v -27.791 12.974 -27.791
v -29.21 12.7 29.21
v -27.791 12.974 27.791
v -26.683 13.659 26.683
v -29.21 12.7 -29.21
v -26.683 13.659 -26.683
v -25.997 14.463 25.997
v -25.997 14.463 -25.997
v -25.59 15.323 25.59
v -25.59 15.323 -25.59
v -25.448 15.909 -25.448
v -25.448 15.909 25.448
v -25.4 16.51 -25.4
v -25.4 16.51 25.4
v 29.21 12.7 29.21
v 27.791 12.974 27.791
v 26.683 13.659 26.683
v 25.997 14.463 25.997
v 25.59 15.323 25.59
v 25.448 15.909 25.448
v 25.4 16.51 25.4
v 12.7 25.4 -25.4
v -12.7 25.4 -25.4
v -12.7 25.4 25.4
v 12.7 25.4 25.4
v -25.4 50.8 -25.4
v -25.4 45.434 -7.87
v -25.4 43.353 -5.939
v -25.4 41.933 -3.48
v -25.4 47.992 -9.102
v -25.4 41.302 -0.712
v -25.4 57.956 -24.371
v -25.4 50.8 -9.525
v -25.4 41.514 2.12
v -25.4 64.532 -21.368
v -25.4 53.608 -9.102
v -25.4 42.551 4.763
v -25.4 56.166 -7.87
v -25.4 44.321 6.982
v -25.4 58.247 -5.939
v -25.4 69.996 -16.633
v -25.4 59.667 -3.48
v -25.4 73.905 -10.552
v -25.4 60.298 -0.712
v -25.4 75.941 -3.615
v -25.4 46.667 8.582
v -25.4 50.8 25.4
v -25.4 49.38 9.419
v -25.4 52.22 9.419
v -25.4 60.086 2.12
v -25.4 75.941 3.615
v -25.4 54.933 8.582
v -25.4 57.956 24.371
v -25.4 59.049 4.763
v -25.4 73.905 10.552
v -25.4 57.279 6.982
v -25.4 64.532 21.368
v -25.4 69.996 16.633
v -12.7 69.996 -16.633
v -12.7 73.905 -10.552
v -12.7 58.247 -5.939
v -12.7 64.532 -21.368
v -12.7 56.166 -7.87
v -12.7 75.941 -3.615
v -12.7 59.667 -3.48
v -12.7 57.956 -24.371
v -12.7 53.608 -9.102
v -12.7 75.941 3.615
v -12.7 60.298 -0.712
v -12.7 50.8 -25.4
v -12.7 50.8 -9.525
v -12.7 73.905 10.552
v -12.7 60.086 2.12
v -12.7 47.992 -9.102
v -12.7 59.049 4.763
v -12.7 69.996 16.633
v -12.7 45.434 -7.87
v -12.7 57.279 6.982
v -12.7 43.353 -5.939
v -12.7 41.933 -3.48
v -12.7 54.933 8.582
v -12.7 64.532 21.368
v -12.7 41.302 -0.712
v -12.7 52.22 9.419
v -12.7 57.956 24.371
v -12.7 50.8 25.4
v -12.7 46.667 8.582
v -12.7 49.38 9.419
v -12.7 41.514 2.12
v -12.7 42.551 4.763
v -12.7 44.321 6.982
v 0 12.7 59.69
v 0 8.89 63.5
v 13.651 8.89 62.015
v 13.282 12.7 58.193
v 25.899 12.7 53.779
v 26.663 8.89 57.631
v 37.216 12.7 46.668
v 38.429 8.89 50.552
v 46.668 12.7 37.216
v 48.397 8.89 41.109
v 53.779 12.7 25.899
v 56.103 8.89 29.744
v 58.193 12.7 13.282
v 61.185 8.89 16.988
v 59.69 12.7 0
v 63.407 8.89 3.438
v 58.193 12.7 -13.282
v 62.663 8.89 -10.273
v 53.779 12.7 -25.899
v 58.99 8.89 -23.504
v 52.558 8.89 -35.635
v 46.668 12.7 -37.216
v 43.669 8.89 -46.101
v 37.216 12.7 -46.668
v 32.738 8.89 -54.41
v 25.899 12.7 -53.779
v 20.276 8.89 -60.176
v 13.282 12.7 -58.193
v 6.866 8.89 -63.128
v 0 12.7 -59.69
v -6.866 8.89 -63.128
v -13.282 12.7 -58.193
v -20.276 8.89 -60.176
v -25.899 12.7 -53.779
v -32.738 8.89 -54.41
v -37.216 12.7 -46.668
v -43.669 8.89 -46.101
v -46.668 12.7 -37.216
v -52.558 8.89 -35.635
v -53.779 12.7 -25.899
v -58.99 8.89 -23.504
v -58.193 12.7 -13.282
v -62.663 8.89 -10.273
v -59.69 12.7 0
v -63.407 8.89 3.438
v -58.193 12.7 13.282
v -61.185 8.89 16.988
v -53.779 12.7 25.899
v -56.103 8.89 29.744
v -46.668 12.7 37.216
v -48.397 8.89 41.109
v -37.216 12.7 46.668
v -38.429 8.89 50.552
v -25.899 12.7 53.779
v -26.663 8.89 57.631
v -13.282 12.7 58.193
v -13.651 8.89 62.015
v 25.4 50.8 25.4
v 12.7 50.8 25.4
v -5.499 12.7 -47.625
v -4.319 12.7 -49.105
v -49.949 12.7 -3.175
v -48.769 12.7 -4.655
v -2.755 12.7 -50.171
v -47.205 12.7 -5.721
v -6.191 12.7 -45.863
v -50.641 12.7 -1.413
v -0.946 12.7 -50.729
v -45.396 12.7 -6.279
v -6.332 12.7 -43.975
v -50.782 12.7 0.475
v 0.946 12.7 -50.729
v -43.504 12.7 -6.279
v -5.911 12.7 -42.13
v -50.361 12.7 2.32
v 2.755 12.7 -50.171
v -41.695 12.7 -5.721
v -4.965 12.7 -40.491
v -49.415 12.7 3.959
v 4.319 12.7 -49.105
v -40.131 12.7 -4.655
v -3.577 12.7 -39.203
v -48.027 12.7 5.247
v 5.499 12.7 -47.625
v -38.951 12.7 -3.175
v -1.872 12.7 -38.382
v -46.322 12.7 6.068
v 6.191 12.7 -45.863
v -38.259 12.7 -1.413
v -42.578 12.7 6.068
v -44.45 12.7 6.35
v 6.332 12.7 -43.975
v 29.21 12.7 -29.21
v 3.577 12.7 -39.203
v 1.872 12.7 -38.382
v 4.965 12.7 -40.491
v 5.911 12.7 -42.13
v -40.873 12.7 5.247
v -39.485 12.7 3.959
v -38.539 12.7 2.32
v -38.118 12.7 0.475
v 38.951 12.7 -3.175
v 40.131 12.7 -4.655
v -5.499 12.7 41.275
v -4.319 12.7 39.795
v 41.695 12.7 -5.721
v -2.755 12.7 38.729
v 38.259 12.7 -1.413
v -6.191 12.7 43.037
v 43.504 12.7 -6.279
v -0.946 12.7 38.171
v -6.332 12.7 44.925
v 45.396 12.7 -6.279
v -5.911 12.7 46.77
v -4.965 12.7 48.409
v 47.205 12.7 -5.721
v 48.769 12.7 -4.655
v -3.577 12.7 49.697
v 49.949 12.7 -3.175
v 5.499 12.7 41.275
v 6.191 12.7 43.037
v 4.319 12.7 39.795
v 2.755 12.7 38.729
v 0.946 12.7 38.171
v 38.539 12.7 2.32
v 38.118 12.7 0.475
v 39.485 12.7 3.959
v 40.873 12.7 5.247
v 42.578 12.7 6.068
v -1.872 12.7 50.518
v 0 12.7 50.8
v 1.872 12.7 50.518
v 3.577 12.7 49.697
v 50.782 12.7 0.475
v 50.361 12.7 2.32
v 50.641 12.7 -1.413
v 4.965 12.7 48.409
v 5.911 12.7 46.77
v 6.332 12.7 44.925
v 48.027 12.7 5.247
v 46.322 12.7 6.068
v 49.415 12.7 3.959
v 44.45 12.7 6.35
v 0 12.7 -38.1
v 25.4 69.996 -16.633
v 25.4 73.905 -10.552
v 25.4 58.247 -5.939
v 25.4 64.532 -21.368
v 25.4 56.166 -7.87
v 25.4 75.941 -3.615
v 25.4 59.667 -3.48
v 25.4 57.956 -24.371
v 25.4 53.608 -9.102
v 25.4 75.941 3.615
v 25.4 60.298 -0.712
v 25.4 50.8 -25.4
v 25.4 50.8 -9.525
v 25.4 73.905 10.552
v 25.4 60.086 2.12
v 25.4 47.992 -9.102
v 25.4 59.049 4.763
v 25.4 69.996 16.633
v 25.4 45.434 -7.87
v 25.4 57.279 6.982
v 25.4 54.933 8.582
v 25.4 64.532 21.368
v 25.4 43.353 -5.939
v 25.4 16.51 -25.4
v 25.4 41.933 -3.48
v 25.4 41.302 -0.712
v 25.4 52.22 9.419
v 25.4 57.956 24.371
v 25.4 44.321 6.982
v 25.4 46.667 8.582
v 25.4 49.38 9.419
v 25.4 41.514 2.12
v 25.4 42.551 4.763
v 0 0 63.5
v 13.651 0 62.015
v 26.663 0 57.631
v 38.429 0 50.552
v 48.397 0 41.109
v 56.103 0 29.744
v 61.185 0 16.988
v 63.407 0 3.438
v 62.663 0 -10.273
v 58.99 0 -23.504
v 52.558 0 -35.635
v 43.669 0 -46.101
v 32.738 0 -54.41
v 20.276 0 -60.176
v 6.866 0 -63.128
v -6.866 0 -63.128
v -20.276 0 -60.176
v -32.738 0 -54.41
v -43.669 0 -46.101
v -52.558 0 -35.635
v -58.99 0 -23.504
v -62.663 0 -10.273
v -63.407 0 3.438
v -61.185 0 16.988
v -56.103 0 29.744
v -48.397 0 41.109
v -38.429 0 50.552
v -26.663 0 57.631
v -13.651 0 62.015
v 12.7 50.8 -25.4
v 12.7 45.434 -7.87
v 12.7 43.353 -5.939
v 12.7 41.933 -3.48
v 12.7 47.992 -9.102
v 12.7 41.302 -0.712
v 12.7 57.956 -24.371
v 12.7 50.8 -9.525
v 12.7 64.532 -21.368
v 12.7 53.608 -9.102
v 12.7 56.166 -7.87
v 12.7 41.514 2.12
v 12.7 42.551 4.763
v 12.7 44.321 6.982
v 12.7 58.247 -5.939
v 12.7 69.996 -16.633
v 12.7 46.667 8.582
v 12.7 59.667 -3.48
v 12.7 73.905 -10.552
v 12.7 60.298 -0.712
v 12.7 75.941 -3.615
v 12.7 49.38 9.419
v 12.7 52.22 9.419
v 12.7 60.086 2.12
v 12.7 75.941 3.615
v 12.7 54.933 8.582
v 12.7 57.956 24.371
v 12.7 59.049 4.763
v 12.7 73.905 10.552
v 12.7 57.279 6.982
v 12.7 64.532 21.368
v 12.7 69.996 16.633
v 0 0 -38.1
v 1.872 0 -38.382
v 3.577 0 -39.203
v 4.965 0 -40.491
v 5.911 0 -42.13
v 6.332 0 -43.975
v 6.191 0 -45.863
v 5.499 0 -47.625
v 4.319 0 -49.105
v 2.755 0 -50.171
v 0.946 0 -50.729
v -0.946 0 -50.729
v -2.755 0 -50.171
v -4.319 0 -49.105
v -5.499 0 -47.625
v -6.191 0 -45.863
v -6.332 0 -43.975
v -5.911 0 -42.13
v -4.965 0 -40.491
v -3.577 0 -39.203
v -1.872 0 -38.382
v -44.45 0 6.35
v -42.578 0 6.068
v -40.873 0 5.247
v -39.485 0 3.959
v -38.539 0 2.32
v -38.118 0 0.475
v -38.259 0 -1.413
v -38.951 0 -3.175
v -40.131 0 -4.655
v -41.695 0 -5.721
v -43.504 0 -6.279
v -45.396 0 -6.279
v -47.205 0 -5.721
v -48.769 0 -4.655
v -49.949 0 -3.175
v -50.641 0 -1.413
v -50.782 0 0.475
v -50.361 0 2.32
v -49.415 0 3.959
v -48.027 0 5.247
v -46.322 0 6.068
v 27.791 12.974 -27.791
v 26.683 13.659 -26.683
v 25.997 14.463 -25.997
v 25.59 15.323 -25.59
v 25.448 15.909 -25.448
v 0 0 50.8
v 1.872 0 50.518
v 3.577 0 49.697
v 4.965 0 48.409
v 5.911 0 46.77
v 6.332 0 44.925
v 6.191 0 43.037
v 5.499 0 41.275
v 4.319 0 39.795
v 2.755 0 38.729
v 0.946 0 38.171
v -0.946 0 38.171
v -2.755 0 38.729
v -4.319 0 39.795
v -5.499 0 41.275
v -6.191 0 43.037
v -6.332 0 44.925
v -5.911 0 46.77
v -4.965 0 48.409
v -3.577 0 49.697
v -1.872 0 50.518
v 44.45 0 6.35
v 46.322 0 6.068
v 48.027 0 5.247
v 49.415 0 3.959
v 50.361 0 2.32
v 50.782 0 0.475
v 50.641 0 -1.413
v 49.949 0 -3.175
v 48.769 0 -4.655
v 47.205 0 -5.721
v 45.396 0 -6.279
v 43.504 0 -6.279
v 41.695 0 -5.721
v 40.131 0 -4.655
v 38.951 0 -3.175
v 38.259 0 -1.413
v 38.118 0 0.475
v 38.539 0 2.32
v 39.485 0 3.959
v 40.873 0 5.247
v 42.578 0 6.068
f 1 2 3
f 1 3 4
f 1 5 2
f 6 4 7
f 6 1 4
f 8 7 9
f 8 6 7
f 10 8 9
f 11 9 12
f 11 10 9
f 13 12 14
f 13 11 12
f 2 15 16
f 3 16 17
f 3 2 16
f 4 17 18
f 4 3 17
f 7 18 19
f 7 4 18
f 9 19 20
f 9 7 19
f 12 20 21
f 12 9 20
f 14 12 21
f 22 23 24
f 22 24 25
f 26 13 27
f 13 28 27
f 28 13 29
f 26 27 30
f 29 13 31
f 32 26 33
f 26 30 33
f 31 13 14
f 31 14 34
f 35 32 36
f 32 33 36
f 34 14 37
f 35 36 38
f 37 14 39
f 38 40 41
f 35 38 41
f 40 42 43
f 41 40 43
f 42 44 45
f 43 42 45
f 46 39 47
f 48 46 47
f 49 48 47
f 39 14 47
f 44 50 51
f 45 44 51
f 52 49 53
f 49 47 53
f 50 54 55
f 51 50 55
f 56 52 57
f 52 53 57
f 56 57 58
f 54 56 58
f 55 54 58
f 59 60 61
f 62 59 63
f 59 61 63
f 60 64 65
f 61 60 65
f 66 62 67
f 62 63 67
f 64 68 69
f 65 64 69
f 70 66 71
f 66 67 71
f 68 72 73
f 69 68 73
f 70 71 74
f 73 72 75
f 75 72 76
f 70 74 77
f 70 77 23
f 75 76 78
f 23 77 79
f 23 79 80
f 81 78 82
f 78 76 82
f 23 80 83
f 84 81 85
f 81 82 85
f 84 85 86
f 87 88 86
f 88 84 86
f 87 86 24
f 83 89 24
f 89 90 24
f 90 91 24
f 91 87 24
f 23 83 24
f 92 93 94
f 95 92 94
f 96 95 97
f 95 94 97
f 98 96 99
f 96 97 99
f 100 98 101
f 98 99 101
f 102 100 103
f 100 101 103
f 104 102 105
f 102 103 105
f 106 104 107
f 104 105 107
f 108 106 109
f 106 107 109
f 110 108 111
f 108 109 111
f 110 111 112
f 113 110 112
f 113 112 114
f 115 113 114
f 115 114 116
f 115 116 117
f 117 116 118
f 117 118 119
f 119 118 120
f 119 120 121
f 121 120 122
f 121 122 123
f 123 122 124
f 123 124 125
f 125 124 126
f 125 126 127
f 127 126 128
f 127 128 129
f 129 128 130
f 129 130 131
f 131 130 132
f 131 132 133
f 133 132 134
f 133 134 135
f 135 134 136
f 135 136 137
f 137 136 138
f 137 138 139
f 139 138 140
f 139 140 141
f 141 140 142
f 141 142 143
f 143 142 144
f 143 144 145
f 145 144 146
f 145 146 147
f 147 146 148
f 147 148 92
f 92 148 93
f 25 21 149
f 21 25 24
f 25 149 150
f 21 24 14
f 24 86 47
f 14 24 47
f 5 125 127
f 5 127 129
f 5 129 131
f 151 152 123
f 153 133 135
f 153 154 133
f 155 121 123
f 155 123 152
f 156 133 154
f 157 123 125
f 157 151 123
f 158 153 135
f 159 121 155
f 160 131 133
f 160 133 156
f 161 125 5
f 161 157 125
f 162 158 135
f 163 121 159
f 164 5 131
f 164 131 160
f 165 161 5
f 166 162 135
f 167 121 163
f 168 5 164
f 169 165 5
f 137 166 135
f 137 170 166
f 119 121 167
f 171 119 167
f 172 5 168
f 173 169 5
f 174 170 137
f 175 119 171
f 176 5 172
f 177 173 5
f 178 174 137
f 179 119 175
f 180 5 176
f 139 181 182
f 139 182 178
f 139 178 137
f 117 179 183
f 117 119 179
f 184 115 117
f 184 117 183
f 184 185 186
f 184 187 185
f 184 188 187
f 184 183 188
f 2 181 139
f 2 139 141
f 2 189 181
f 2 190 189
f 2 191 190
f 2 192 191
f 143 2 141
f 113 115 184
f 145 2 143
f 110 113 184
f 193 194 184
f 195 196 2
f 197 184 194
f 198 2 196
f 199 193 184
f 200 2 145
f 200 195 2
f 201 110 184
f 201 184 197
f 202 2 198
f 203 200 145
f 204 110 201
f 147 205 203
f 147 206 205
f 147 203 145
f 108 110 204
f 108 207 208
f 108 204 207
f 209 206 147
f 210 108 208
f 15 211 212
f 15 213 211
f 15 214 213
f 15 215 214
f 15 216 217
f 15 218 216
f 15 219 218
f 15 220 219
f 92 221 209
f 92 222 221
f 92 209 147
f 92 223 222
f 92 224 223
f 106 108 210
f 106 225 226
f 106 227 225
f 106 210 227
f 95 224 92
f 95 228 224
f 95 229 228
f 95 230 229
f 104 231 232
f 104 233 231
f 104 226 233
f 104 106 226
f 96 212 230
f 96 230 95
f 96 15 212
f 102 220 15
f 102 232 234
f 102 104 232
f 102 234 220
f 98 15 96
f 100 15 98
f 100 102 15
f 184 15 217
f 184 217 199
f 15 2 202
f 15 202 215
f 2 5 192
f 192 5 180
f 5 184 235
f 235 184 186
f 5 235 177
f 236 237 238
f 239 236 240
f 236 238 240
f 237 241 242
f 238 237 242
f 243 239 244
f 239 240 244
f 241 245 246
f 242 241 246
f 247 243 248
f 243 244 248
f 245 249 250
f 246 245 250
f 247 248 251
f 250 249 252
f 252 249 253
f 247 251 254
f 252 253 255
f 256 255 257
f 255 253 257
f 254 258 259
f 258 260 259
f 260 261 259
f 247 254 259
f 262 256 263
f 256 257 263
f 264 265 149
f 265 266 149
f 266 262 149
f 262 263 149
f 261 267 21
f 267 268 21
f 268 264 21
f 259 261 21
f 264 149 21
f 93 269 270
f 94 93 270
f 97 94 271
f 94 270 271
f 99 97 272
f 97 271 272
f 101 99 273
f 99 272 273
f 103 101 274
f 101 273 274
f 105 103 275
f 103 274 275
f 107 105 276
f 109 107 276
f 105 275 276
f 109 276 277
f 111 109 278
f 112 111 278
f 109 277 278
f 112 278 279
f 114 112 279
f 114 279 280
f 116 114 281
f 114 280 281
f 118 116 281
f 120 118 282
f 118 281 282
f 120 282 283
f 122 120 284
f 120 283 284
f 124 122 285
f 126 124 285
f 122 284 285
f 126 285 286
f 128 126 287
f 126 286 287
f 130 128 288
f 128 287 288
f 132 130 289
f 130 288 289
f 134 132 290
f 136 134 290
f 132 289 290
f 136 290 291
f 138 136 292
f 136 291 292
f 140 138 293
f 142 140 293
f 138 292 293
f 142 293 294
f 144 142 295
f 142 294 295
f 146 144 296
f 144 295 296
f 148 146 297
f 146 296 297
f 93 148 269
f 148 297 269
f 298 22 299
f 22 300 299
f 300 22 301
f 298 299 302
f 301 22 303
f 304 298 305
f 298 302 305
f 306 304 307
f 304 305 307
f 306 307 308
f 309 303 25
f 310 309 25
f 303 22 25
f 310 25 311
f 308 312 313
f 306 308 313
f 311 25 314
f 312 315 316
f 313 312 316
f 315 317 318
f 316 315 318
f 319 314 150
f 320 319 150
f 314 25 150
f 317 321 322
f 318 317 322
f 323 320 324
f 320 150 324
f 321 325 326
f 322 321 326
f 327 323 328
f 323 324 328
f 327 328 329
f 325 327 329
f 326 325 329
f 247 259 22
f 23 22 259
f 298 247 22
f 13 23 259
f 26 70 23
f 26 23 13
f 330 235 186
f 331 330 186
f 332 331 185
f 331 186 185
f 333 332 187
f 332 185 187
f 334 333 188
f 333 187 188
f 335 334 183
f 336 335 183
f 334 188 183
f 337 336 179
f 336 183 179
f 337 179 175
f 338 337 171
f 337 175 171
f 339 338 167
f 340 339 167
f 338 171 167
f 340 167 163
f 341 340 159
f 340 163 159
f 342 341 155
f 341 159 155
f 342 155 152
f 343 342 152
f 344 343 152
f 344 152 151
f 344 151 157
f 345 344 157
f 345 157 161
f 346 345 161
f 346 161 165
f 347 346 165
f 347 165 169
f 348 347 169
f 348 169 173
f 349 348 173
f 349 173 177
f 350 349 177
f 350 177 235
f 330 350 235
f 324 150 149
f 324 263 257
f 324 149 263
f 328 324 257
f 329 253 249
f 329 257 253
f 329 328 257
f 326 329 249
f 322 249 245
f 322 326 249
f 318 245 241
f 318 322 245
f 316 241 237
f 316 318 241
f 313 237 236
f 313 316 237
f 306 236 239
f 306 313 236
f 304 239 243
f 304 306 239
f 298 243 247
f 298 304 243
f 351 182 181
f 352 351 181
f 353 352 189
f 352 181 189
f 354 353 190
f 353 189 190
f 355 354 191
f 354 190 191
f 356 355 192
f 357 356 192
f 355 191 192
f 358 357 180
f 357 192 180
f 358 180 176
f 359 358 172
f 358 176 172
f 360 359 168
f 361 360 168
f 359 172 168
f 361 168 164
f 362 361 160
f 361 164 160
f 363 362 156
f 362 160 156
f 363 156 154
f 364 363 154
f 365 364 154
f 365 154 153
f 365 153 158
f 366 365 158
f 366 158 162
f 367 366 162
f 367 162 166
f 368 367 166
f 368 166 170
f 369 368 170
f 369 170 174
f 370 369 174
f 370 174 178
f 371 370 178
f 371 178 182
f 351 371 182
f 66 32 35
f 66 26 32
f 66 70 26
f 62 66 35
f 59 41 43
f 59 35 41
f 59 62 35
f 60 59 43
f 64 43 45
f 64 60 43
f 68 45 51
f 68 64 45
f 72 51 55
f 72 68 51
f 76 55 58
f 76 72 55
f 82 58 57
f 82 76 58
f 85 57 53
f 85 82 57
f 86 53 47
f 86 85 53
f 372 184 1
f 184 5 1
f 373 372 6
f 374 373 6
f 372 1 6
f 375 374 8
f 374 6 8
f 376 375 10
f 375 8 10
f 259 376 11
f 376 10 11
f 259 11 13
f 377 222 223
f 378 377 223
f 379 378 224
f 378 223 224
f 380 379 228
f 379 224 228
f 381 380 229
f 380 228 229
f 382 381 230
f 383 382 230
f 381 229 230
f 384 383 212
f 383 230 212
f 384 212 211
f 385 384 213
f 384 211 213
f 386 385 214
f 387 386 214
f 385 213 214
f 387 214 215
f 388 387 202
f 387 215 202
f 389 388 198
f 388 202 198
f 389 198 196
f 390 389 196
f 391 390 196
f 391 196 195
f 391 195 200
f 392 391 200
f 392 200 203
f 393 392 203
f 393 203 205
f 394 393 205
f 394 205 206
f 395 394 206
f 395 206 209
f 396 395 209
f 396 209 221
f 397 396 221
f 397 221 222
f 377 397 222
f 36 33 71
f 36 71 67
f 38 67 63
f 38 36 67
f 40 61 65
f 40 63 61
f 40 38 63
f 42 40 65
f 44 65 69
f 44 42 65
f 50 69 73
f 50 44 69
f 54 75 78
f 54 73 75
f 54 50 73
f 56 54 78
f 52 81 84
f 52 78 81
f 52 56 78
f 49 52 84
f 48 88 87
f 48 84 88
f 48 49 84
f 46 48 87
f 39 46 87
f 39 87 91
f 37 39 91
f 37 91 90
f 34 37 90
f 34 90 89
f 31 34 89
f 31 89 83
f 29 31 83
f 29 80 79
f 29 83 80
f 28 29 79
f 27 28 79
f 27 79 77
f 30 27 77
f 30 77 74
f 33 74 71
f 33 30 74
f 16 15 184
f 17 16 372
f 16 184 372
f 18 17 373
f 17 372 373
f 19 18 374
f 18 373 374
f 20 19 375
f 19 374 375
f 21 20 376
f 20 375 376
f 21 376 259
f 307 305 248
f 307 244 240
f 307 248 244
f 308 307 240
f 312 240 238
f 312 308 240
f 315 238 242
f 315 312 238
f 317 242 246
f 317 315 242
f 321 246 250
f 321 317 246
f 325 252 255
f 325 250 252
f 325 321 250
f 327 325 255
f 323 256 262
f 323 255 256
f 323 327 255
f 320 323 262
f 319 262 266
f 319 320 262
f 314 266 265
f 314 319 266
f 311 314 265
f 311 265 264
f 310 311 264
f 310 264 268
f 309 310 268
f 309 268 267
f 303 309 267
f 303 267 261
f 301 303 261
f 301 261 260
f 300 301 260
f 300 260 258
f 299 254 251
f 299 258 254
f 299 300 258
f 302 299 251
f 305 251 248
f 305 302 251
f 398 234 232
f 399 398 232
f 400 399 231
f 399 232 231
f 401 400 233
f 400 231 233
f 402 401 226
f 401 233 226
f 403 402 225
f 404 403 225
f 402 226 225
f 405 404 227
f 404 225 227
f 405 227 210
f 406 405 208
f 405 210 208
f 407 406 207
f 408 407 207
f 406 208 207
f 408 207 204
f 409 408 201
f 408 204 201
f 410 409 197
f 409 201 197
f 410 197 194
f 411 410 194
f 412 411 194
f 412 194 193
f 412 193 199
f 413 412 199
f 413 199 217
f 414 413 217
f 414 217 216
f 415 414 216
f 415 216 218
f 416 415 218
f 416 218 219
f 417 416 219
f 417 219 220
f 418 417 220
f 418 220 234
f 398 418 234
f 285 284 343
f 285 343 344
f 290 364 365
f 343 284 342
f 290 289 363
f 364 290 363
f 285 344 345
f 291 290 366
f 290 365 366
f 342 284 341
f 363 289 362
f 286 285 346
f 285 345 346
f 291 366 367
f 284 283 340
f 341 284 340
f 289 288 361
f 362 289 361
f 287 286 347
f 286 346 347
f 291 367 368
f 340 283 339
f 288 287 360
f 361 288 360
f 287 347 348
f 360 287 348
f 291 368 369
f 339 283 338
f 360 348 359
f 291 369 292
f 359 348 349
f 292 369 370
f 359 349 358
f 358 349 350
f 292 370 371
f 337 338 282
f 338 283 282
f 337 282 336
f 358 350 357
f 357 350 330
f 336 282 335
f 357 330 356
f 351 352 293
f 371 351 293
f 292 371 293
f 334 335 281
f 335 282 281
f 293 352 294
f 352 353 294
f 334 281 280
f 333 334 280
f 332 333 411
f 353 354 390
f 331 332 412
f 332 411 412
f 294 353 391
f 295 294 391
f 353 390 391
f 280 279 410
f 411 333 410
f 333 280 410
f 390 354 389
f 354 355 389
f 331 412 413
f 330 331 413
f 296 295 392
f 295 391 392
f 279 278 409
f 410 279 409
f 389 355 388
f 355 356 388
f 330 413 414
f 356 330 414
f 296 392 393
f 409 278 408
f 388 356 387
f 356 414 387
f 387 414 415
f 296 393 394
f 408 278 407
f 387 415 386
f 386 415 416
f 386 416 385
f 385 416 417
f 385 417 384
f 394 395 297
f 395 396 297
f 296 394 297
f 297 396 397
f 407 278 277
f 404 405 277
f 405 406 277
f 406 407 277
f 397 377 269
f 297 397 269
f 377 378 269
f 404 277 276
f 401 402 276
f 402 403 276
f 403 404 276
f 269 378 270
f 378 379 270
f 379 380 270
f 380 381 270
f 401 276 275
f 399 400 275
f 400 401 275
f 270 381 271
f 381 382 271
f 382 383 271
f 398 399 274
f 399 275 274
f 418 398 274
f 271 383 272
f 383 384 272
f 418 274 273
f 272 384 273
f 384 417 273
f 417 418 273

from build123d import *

# Parameters (mm, degrees)
SKETCH1_R           = 63.5
BASE_DEPTH          = 12.7
MOUNT_DEPTH         = 25.4
FILLET1_RADIUS      = 25.4
FILLET1_LENGTH      = 12.7
FILLET2_RADIUS      = 25.4
FILLET2_LENGTH      = 12.7
PIN_HOLE_DEPTH      = 118.774954893
PIN_HOLE_DEPTH_BACK = 118.774954893
SKETCH3_R           = 9.525
SKETCH4_R           = 6.35
BOLT_PATTERN_DEPTH  = 110.985226281
FILLET3_R           = 3.81
CHAMFER1_SIZE       = 3.81


with BuildPart() as part:
    # Sketch1 → Base (new body)
    with BuildSketch(Plane(origin=(0, 0, 0), x_dir=(1, 0, 0), z_dir=(0, 1, 0))):
        with Locations(Location((0, 0, 0), (0, 0, 270))):
            Circle(SKETCH1_R)
    extrude(amount=BASE_DEPTH)

    # Sketch2 → Mount (add, symmetric)
    with BuildSketch(Plane.XY):
        Polygon((-12.7, 25.4), (12.7, 25.4), (12.7, 76.2), (25.4, 76.2), (25.4, 12.7), (-25.4, 12.7), (-25.4, 76.2), (-12.7, 76.2), align=None)
    extrude(amount=MOUNT_DEPTH, both=True)

    # Fillet1: full round fillet: the end face becomes a half cylinder, R = half its width
    fillet1_face = Plane((19.05, 76.2, 0), x_dir=(-1, 0, 0), z_dir=(0, 1, 0))  # on the end face: x along it, z out of the body
    fillet1_slab = fillet1_face.offset(-FILLET1_RADIUS / 2) * Box(FILLET1_LENGTH, 2 * FILLET1_RADIUS, FILLET1_RADIUS, mode=Mode.PRIVATE)  # the body's end, R deep
    fillet1_round = Plane((19.05, 50.8, 0), x_dir=(0, 1, 0), z_dir=(-1, 0, 0)) * Cylinder(FILLET1_RADIUS, FILLET1_LENGTH, mode=Mode.PRIVATE)  # its axis R under the face
    add(fillet1_slab - fillet1_round, mode=Mode.SUBTRACT)

    # Fillet2: full round fillet: the end face becomes a half cylinder, R = half its width
    fillet2_face = Plane((-19.05, 76.2, 0), x_dir=(1, 0, 0), z_dir=(0, 1, 0))  # on the end face: x along it, z out of the body
    fillet2_slab = fillet2_face.offset(-FILLET2_RADIUS / 2) * Box(FILLET2_LENGTH, 2 * FILLET2_RADIUS, FILLET2_RADIUS, mode=Mode.PRIVATE)  # the body's end, R deep
    fillet2_round = Plane((-19.05, 50.8, 0), x_dir=(0, 1, 0), z_dir=(1, 0, 0)) * Cylinder(FILLET2_RADIUS, FILLET2_LENGTH, mode=Mode.PRIVATE)  # its axis R under the face
    add(fillet2_slab - fillet2_round, mode=Mode.SUBTRACT)

    # Sketch3 → Pin Hole (cut, two sides: drawn at the far end of the back side and taken through both)
    with BuildSketch(Plane(origin=(0, 0, 0), x_dir=(0, 0, -1), z_dir=(1, 0, 0)).offset(-PIN_HOLE_DEPTH_BACK)):
        with Locations((0, 50.8)):
            Circle(SKETCH3_R)
    extrude(amount=PIN_HOLE_DEPTH + PIN_HOLE_DEPTH_BACK, mode=Mode.SUBTRACT)

    # Sketch4 → Bolt Pattern (cut, through all)
    with BuildSketch(Plane(origin=(0, 12.7, 0), x_dir=(1, 0, 0), z_dir=(0, 1, 0))):
        with Locations(Location((0, -44.45, 0), (0, 0, 270))):
            Circle(SKETCH4_R)
        with Locations(Location((-44.45, 0, 0), (0, 0, 270))):
            Circle(SKETCH4_R)
        with Locations(Location((0, 44.45, 0), (0, 0, 270))):
            Circle(SKETCH4_R)
        with Locations(Location((44.45, 0, 0), (0, 0, 270))):
            Circle(SKETCH4_R)
    extrude(amount=-BOLT_PATTERN_DEPTH, mode=Mode.SUBTRACT)

    # Fillet3
    fillet3_edges = [part.edges().sort_by_distance(p)[0] for p in [
        (25.4, 12.7, 0),
        (0, 12.7, 25.4),
        (0, 12.7, -25.4),
        (-25.4, 12.7, 0),
    ]]
    fillet(fillet3_edges, radius=FILLET3_R)

    # Chamfer1
    chamfer1_edges = [part.edges().sort_by_distance(p)[0] for p in [
        (0, 12.7, -63.5),
    ]]
    chamfer(chamfer1_edges, length=CHAMFER1_SIZE)


solid = part.part
